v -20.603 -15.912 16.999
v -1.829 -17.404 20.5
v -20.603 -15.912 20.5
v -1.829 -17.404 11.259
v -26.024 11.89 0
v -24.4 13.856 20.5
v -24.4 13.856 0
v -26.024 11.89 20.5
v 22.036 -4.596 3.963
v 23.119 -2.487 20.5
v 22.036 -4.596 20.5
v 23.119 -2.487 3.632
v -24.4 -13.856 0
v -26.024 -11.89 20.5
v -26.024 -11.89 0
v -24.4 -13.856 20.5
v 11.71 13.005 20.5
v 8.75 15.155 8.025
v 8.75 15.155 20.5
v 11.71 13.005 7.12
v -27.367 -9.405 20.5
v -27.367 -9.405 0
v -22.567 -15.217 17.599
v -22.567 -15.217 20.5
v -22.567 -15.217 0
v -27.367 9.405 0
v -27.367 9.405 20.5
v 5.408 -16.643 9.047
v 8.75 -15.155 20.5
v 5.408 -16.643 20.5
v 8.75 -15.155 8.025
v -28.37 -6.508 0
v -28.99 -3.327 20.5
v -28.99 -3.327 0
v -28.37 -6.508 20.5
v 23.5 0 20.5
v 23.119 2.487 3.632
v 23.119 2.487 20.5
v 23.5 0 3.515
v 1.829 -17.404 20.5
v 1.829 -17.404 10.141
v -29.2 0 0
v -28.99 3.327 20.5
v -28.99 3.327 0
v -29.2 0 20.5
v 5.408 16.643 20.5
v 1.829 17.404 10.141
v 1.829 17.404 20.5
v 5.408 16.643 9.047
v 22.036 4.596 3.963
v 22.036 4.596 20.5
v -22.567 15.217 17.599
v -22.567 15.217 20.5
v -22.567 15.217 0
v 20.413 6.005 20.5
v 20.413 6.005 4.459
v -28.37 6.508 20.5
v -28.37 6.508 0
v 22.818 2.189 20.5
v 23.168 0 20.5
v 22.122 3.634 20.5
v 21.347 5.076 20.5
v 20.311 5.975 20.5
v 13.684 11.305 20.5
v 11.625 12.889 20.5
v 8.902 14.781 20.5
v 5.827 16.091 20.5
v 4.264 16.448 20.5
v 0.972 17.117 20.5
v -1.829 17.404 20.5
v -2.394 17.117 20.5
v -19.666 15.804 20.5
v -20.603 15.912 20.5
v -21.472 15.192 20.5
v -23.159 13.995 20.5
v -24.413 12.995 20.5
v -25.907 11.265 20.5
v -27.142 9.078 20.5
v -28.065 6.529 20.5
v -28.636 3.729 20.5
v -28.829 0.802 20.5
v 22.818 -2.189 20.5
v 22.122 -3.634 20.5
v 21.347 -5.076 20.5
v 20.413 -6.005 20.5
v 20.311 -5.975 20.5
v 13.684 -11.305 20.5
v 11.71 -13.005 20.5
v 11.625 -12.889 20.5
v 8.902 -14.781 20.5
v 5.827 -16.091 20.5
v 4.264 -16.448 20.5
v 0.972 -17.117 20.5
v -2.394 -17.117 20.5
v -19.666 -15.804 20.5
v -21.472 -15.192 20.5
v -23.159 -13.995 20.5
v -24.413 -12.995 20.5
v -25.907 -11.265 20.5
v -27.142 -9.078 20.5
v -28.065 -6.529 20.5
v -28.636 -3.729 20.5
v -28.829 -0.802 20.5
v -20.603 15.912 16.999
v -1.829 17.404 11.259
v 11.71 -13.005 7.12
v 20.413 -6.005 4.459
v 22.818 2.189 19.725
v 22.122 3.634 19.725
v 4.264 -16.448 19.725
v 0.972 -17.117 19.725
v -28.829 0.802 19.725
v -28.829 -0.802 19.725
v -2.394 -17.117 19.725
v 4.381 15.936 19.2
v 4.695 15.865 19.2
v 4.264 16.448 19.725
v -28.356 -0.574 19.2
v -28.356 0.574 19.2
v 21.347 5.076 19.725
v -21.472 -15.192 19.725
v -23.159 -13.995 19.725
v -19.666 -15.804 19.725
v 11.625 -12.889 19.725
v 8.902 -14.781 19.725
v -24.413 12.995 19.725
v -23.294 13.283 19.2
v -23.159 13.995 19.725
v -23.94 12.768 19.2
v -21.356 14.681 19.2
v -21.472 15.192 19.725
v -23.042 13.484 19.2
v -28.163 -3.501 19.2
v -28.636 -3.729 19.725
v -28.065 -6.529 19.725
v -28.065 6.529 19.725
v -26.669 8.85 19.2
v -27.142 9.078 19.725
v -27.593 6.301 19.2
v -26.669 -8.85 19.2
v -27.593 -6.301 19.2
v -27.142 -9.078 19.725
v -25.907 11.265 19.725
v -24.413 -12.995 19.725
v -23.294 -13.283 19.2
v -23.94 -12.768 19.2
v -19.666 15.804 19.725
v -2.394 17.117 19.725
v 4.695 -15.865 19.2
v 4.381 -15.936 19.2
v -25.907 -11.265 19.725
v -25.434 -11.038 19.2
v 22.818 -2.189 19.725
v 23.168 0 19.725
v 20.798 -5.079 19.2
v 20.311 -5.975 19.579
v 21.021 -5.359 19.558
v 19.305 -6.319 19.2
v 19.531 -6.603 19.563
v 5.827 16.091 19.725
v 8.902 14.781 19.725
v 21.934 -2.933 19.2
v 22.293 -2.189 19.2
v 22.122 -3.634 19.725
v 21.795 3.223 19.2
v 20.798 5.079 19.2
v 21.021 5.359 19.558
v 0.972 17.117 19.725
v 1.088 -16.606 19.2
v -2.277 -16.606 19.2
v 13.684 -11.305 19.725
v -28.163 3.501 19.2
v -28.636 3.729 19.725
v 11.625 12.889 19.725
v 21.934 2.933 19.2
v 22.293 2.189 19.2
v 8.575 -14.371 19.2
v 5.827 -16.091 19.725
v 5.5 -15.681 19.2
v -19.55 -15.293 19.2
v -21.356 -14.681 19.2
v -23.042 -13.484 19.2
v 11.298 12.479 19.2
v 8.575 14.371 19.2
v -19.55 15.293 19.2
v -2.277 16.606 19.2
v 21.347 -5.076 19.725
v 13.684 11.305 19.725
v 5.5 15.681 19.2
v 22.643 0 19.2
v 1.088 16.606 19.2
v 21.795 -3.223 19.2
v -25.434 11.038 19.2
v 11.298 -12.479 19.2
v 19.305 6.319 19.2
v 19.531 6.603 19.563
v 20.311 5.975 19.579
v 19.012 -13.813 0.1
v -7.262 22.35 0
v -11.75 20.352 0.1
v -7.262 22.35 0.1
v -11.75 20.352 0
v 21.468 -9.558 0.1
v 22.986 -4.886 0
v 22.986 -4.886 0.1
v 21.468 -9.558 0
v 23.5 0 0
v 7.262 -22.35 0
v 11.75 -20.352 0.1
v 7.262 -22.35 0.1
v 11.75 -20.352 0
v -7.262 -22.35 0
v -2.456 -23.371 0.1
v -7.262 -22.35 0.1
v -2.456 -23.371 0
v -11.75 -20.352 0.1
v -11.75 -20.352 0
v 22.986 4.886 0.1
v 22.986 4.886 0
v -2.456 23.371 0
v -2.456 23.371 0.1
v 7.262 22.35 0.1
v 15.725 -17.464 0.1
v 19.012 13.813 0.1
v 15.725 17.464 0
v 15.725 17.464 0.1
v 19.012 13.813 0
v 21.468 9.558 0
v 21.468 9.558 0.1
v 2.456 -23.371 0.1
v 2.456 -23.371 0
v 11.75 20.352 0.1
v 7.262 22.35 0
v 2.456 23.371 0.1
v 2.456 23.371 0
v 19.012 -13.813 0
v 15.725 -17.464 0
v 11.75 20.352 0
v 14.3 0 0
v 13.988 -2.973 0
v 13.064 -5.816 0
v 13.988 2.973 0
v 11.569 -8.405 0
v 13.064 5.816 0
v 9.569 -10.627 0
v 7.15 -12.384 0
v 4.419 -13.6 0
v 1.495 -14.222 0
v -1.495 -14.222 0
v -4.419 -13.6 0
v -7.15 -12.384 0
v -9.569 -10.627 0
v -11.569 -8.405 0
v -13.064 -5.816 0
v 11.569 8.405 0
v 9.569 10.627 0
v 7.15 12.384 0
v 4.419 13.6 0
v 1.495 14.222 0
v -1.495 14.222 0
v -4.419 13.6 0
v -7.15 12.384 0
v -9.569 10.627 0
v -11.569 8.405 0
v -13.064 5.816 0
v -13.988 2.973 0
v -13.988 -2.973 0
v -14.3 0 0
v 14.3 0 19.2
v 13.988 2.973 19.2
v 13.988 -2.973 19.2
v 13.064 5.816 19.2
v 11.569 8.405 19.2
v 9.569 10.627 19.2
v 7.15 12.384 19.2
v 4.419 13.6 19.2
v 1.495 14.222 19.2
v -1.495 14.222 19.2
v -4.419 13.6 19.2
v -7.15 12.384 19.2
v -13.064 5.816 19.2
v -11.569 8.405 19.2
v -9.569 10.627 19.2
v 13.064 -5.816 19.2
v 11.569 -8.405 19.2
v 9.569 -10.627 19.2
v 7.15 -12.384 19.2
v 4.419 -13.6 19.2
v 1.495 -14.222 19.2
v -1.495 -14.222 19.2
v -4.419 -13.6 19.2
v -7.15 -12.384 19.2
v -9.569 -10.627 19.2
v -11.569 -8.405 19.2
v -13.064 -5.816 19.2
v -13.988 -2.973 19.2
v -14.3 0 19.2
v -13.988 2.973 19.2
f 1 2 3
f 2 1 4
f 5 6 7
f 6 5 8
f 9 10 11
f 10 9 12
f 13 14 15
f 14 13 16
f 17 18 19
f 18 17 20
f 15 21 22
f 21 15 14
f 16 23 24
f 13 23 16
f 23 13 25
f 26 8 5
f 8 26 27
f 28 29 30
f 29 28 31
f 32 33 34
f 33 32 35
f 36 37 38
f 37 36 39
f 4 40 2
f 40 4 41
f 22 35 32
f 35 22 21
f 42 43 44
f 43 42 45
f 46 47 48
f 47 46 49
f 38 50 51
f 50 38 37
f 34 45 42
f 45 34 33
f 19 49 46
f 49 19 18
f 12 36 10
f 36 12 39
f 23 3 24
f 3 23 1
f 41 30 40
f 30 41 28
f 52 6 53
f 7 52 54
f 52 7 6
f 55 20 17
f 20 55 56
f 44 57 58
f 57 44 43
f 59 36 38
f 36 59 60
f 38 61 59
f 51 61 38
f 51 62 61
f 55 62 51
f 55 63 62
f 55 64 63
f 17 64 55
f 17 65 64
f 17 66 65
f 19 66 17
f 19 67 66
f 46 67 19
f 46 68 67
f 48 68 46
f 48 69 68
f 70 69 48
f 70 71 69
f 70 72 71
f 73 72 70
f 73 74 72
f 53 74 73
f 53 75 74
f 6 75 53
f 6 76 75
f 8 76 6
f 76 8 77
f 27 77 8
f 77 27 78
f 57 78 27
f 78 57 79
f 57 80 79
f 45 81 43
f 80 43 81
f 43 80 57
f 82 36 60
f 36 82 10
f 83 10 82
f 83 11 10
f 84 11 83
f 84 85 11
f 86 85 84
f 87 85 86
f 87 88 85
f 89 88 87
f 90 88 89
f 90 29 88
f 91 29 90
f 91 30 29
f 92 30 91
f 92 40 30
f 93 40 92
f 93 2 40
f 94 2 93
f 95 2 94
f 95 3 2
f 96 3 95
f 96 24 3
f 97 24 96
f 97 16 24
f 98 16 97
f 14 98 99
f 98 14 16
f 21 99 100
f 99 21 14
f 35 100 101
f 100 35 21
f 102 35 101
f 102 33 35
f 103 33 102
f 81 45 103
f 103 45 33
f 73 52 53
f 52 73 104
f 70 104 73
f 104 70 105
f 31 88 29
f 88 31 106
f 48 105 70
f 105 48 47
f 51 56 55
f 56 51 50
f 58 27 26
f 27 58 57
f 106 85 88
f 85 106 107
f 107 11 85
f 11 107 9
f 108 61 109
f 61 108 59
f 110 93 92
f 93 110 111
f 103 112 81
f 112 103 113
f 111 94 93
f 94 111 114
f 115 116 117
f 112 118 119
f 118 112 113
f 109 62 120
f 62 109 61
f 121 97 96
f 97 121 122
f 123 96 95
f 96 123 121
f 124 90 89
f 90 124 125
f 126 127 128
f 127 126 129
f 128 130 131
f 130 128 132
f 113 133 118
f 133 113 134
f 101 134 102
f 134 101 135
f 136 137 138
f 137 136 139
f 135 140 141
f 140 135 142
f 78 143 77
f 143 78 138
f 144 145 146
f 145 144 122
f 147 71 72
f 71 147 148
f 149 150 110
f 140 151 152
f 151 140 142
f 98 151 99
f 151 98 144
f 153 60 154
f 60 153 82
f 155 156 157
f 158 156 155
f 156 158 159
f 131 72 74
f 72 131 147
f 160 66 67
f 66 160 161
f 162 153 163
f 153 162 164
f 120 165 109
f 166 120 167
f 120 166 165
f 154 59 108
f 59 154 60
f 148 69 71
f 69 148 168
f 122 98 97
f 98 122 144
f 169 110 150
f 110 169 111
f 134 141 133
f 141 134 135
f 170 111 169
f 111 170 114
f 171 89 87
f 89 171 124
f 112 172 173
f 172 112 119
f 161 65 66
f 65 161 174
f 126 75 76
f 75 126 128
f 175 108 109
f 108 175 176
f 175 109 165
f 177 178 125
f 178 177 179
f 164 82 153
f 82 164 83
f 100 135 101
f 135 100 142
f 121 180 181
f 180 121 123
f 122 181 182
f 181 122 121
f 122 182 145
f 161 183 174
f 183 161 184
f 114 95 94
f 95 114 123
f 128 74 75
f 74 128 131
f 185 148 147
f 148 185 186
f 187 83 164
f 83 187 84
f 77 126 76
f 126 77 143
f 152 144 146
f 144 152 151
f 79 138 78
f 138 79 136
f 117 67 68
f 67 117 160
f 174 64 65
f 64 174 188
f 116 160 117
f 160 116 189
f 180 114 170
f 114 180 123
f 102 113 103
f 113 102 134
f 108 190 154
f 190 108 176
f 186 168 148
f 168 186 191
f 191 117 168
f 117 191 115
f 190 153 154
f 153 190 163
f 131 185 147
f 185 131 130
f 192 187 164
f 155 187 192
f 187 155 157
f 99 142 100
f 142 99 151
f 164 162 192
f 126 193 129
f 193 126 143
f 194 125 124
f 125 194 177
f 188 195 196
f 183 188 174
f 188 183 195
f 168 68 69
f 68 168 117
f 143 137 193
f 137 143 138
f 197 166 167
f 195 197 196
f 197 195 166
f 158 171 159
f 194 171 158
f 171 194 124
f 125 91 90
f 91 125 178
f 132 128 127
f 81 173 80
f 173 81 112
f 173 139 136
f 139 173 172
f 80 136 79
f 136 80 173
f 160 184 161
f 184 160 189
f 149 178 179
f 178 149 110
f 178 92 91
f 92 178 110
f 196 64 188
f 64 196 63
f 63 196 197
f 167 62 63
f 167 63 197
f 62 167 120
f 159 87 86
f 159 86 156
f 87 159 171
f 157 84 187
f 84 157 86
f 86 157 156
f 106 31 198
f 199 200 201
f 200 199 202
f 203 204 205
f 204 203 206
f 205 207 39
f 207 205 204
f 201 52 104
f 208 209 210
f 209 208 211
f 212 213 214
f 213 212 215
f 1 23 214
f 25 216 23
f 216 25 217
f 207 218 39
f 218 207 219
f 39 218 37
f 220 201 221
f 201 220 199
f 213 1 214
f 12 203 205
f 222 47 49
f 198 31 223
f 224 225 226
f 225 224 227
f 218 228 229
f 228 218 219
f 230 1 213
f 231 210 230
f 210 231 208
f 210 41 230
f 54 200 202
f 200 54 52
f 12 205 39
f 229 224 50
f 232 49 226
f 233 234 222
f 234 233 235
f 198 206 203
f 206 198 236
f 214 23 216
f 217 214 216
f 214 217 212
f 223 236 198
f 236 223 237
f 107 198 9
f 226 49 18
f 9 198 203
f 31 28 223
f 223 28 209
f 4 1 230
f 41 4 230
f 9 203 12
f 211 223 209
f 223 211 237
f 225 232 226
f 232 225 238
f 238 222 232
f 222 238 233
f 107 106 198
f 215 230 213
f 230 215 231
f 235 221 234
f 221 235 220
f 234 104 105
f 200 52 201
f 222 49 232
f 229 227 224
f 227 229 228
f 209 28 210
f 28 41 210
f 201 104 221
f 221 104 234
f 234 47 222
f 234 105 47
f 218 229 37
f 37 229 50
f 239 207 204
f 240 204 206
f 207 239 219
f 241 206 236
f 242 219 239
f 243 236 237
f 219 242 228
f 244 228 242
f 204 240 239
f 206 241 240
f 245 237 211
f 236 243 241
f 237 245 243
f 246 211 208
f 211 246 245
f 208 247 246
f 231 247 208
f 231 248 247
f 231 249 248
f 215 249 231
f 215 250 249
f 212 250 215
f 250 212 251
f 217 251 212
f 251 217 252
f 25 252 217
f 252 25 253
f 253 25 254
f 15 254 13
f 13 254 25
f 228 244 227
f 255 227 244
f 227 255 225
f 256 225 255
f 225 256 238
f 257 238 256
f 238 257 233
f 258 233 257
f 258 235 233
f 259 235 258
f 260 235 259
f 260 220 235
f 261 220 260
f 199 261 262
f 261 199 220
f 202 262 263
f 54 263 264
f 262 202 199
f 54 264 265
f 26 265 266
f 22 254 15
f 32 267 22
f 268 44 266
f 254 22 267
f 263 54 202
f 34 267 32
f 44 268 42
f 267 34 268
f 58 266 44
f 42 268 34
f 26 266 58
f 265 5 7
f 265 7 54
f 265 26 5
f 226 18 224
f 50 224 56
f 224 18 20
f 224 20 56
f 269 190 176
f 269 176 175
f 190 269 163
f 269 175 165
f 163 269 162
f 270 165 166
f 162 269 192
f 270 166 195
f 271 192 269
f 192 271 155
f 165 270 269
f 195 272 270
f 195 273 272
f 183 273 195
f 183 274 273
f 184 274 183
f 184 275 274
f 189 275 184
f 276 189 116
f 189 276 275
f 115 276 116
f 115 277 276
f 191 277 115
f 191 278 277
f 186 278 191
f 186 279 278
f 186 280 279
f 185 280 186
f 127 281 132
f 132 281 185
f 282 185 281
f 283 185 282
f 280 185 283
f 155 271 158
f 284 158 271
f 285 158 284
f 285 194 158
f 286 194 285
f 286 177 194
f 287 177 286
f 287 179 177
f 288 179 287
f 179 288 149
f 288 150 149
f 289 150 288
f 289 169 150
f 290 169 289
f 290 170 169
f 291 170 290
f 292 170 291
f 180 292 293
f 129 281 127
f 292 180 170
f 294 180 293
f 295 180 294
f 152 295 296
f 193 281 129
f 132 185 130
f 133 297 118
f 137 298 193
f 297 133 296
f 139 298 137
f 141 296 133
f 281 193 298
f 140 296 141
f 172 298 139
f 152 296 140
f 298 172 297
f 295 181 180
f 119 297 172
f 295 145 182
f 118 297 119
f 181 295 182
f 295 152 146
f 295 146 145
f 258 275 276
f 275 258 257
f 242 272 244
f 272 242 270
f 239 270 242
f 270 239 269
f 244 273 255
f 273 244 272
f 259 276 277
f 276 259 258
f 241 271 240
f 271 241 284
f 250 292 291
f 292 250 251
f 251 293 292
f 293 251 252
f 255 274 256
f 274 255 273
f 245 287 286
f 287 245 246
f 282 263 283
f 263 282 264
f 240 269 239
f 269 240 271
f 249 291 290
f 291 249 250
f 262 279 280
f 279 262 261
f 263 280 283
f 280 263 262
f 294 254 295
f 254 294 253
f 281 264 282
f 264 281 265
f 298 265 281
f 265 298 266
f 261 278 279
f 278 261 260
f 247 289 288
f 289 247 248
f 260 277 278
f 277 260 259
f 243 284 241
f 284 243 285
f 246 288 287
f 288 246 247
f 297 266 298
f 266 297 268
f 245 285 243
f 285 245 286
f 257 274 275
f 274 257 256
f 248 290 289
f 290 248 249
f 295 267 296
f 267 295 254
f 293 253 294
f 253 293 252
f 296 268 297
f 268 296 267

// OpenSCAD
//$fn=150;

module fork(height) { translate([0, 0, -0.01]) cylinder(h=height + 0.01, d=28.6); }
module neck(height) {
	hull()
	{
		translate([18.5,0,0]) scale([1,1.3,1]) cylinder(h=height, d=10);
		cylinder(h=height, d=35);
		translate([-19.6,0,0]) scale([0.6,1,1]) cylinder(h=height, d=32);
	}
}

difference()
{	union()
	{	hull()
		{	cylinder(d=47, h=0.1);
			difference()
			{	neck(18.5);
				translate([0,0,10.7]) rotate([0,17,0]) cylinder(d=70, h=20);
			}
		}
		translate([0,0,3.5]) neck(15.7);
		translate([0,0,18.5])
		union()
		{
			difference()
			{	neck(2);
				translate([-0.3,0,1.99]) minkowski()
				{
					scale([0.92,0.88,0.25]) neck(1);
					sphere(2);
				}
			}
			difference()
			{
				neck(2);
				translate([0,0,-1]) scale([0.995,0.995,1]) neck(4);
			}
		}
	}
	fork(100);
}

// Construction figure: theorical stem circumference
*#translate([-4.3,0,19.21]) cylinder(h=0.1, d=50);
